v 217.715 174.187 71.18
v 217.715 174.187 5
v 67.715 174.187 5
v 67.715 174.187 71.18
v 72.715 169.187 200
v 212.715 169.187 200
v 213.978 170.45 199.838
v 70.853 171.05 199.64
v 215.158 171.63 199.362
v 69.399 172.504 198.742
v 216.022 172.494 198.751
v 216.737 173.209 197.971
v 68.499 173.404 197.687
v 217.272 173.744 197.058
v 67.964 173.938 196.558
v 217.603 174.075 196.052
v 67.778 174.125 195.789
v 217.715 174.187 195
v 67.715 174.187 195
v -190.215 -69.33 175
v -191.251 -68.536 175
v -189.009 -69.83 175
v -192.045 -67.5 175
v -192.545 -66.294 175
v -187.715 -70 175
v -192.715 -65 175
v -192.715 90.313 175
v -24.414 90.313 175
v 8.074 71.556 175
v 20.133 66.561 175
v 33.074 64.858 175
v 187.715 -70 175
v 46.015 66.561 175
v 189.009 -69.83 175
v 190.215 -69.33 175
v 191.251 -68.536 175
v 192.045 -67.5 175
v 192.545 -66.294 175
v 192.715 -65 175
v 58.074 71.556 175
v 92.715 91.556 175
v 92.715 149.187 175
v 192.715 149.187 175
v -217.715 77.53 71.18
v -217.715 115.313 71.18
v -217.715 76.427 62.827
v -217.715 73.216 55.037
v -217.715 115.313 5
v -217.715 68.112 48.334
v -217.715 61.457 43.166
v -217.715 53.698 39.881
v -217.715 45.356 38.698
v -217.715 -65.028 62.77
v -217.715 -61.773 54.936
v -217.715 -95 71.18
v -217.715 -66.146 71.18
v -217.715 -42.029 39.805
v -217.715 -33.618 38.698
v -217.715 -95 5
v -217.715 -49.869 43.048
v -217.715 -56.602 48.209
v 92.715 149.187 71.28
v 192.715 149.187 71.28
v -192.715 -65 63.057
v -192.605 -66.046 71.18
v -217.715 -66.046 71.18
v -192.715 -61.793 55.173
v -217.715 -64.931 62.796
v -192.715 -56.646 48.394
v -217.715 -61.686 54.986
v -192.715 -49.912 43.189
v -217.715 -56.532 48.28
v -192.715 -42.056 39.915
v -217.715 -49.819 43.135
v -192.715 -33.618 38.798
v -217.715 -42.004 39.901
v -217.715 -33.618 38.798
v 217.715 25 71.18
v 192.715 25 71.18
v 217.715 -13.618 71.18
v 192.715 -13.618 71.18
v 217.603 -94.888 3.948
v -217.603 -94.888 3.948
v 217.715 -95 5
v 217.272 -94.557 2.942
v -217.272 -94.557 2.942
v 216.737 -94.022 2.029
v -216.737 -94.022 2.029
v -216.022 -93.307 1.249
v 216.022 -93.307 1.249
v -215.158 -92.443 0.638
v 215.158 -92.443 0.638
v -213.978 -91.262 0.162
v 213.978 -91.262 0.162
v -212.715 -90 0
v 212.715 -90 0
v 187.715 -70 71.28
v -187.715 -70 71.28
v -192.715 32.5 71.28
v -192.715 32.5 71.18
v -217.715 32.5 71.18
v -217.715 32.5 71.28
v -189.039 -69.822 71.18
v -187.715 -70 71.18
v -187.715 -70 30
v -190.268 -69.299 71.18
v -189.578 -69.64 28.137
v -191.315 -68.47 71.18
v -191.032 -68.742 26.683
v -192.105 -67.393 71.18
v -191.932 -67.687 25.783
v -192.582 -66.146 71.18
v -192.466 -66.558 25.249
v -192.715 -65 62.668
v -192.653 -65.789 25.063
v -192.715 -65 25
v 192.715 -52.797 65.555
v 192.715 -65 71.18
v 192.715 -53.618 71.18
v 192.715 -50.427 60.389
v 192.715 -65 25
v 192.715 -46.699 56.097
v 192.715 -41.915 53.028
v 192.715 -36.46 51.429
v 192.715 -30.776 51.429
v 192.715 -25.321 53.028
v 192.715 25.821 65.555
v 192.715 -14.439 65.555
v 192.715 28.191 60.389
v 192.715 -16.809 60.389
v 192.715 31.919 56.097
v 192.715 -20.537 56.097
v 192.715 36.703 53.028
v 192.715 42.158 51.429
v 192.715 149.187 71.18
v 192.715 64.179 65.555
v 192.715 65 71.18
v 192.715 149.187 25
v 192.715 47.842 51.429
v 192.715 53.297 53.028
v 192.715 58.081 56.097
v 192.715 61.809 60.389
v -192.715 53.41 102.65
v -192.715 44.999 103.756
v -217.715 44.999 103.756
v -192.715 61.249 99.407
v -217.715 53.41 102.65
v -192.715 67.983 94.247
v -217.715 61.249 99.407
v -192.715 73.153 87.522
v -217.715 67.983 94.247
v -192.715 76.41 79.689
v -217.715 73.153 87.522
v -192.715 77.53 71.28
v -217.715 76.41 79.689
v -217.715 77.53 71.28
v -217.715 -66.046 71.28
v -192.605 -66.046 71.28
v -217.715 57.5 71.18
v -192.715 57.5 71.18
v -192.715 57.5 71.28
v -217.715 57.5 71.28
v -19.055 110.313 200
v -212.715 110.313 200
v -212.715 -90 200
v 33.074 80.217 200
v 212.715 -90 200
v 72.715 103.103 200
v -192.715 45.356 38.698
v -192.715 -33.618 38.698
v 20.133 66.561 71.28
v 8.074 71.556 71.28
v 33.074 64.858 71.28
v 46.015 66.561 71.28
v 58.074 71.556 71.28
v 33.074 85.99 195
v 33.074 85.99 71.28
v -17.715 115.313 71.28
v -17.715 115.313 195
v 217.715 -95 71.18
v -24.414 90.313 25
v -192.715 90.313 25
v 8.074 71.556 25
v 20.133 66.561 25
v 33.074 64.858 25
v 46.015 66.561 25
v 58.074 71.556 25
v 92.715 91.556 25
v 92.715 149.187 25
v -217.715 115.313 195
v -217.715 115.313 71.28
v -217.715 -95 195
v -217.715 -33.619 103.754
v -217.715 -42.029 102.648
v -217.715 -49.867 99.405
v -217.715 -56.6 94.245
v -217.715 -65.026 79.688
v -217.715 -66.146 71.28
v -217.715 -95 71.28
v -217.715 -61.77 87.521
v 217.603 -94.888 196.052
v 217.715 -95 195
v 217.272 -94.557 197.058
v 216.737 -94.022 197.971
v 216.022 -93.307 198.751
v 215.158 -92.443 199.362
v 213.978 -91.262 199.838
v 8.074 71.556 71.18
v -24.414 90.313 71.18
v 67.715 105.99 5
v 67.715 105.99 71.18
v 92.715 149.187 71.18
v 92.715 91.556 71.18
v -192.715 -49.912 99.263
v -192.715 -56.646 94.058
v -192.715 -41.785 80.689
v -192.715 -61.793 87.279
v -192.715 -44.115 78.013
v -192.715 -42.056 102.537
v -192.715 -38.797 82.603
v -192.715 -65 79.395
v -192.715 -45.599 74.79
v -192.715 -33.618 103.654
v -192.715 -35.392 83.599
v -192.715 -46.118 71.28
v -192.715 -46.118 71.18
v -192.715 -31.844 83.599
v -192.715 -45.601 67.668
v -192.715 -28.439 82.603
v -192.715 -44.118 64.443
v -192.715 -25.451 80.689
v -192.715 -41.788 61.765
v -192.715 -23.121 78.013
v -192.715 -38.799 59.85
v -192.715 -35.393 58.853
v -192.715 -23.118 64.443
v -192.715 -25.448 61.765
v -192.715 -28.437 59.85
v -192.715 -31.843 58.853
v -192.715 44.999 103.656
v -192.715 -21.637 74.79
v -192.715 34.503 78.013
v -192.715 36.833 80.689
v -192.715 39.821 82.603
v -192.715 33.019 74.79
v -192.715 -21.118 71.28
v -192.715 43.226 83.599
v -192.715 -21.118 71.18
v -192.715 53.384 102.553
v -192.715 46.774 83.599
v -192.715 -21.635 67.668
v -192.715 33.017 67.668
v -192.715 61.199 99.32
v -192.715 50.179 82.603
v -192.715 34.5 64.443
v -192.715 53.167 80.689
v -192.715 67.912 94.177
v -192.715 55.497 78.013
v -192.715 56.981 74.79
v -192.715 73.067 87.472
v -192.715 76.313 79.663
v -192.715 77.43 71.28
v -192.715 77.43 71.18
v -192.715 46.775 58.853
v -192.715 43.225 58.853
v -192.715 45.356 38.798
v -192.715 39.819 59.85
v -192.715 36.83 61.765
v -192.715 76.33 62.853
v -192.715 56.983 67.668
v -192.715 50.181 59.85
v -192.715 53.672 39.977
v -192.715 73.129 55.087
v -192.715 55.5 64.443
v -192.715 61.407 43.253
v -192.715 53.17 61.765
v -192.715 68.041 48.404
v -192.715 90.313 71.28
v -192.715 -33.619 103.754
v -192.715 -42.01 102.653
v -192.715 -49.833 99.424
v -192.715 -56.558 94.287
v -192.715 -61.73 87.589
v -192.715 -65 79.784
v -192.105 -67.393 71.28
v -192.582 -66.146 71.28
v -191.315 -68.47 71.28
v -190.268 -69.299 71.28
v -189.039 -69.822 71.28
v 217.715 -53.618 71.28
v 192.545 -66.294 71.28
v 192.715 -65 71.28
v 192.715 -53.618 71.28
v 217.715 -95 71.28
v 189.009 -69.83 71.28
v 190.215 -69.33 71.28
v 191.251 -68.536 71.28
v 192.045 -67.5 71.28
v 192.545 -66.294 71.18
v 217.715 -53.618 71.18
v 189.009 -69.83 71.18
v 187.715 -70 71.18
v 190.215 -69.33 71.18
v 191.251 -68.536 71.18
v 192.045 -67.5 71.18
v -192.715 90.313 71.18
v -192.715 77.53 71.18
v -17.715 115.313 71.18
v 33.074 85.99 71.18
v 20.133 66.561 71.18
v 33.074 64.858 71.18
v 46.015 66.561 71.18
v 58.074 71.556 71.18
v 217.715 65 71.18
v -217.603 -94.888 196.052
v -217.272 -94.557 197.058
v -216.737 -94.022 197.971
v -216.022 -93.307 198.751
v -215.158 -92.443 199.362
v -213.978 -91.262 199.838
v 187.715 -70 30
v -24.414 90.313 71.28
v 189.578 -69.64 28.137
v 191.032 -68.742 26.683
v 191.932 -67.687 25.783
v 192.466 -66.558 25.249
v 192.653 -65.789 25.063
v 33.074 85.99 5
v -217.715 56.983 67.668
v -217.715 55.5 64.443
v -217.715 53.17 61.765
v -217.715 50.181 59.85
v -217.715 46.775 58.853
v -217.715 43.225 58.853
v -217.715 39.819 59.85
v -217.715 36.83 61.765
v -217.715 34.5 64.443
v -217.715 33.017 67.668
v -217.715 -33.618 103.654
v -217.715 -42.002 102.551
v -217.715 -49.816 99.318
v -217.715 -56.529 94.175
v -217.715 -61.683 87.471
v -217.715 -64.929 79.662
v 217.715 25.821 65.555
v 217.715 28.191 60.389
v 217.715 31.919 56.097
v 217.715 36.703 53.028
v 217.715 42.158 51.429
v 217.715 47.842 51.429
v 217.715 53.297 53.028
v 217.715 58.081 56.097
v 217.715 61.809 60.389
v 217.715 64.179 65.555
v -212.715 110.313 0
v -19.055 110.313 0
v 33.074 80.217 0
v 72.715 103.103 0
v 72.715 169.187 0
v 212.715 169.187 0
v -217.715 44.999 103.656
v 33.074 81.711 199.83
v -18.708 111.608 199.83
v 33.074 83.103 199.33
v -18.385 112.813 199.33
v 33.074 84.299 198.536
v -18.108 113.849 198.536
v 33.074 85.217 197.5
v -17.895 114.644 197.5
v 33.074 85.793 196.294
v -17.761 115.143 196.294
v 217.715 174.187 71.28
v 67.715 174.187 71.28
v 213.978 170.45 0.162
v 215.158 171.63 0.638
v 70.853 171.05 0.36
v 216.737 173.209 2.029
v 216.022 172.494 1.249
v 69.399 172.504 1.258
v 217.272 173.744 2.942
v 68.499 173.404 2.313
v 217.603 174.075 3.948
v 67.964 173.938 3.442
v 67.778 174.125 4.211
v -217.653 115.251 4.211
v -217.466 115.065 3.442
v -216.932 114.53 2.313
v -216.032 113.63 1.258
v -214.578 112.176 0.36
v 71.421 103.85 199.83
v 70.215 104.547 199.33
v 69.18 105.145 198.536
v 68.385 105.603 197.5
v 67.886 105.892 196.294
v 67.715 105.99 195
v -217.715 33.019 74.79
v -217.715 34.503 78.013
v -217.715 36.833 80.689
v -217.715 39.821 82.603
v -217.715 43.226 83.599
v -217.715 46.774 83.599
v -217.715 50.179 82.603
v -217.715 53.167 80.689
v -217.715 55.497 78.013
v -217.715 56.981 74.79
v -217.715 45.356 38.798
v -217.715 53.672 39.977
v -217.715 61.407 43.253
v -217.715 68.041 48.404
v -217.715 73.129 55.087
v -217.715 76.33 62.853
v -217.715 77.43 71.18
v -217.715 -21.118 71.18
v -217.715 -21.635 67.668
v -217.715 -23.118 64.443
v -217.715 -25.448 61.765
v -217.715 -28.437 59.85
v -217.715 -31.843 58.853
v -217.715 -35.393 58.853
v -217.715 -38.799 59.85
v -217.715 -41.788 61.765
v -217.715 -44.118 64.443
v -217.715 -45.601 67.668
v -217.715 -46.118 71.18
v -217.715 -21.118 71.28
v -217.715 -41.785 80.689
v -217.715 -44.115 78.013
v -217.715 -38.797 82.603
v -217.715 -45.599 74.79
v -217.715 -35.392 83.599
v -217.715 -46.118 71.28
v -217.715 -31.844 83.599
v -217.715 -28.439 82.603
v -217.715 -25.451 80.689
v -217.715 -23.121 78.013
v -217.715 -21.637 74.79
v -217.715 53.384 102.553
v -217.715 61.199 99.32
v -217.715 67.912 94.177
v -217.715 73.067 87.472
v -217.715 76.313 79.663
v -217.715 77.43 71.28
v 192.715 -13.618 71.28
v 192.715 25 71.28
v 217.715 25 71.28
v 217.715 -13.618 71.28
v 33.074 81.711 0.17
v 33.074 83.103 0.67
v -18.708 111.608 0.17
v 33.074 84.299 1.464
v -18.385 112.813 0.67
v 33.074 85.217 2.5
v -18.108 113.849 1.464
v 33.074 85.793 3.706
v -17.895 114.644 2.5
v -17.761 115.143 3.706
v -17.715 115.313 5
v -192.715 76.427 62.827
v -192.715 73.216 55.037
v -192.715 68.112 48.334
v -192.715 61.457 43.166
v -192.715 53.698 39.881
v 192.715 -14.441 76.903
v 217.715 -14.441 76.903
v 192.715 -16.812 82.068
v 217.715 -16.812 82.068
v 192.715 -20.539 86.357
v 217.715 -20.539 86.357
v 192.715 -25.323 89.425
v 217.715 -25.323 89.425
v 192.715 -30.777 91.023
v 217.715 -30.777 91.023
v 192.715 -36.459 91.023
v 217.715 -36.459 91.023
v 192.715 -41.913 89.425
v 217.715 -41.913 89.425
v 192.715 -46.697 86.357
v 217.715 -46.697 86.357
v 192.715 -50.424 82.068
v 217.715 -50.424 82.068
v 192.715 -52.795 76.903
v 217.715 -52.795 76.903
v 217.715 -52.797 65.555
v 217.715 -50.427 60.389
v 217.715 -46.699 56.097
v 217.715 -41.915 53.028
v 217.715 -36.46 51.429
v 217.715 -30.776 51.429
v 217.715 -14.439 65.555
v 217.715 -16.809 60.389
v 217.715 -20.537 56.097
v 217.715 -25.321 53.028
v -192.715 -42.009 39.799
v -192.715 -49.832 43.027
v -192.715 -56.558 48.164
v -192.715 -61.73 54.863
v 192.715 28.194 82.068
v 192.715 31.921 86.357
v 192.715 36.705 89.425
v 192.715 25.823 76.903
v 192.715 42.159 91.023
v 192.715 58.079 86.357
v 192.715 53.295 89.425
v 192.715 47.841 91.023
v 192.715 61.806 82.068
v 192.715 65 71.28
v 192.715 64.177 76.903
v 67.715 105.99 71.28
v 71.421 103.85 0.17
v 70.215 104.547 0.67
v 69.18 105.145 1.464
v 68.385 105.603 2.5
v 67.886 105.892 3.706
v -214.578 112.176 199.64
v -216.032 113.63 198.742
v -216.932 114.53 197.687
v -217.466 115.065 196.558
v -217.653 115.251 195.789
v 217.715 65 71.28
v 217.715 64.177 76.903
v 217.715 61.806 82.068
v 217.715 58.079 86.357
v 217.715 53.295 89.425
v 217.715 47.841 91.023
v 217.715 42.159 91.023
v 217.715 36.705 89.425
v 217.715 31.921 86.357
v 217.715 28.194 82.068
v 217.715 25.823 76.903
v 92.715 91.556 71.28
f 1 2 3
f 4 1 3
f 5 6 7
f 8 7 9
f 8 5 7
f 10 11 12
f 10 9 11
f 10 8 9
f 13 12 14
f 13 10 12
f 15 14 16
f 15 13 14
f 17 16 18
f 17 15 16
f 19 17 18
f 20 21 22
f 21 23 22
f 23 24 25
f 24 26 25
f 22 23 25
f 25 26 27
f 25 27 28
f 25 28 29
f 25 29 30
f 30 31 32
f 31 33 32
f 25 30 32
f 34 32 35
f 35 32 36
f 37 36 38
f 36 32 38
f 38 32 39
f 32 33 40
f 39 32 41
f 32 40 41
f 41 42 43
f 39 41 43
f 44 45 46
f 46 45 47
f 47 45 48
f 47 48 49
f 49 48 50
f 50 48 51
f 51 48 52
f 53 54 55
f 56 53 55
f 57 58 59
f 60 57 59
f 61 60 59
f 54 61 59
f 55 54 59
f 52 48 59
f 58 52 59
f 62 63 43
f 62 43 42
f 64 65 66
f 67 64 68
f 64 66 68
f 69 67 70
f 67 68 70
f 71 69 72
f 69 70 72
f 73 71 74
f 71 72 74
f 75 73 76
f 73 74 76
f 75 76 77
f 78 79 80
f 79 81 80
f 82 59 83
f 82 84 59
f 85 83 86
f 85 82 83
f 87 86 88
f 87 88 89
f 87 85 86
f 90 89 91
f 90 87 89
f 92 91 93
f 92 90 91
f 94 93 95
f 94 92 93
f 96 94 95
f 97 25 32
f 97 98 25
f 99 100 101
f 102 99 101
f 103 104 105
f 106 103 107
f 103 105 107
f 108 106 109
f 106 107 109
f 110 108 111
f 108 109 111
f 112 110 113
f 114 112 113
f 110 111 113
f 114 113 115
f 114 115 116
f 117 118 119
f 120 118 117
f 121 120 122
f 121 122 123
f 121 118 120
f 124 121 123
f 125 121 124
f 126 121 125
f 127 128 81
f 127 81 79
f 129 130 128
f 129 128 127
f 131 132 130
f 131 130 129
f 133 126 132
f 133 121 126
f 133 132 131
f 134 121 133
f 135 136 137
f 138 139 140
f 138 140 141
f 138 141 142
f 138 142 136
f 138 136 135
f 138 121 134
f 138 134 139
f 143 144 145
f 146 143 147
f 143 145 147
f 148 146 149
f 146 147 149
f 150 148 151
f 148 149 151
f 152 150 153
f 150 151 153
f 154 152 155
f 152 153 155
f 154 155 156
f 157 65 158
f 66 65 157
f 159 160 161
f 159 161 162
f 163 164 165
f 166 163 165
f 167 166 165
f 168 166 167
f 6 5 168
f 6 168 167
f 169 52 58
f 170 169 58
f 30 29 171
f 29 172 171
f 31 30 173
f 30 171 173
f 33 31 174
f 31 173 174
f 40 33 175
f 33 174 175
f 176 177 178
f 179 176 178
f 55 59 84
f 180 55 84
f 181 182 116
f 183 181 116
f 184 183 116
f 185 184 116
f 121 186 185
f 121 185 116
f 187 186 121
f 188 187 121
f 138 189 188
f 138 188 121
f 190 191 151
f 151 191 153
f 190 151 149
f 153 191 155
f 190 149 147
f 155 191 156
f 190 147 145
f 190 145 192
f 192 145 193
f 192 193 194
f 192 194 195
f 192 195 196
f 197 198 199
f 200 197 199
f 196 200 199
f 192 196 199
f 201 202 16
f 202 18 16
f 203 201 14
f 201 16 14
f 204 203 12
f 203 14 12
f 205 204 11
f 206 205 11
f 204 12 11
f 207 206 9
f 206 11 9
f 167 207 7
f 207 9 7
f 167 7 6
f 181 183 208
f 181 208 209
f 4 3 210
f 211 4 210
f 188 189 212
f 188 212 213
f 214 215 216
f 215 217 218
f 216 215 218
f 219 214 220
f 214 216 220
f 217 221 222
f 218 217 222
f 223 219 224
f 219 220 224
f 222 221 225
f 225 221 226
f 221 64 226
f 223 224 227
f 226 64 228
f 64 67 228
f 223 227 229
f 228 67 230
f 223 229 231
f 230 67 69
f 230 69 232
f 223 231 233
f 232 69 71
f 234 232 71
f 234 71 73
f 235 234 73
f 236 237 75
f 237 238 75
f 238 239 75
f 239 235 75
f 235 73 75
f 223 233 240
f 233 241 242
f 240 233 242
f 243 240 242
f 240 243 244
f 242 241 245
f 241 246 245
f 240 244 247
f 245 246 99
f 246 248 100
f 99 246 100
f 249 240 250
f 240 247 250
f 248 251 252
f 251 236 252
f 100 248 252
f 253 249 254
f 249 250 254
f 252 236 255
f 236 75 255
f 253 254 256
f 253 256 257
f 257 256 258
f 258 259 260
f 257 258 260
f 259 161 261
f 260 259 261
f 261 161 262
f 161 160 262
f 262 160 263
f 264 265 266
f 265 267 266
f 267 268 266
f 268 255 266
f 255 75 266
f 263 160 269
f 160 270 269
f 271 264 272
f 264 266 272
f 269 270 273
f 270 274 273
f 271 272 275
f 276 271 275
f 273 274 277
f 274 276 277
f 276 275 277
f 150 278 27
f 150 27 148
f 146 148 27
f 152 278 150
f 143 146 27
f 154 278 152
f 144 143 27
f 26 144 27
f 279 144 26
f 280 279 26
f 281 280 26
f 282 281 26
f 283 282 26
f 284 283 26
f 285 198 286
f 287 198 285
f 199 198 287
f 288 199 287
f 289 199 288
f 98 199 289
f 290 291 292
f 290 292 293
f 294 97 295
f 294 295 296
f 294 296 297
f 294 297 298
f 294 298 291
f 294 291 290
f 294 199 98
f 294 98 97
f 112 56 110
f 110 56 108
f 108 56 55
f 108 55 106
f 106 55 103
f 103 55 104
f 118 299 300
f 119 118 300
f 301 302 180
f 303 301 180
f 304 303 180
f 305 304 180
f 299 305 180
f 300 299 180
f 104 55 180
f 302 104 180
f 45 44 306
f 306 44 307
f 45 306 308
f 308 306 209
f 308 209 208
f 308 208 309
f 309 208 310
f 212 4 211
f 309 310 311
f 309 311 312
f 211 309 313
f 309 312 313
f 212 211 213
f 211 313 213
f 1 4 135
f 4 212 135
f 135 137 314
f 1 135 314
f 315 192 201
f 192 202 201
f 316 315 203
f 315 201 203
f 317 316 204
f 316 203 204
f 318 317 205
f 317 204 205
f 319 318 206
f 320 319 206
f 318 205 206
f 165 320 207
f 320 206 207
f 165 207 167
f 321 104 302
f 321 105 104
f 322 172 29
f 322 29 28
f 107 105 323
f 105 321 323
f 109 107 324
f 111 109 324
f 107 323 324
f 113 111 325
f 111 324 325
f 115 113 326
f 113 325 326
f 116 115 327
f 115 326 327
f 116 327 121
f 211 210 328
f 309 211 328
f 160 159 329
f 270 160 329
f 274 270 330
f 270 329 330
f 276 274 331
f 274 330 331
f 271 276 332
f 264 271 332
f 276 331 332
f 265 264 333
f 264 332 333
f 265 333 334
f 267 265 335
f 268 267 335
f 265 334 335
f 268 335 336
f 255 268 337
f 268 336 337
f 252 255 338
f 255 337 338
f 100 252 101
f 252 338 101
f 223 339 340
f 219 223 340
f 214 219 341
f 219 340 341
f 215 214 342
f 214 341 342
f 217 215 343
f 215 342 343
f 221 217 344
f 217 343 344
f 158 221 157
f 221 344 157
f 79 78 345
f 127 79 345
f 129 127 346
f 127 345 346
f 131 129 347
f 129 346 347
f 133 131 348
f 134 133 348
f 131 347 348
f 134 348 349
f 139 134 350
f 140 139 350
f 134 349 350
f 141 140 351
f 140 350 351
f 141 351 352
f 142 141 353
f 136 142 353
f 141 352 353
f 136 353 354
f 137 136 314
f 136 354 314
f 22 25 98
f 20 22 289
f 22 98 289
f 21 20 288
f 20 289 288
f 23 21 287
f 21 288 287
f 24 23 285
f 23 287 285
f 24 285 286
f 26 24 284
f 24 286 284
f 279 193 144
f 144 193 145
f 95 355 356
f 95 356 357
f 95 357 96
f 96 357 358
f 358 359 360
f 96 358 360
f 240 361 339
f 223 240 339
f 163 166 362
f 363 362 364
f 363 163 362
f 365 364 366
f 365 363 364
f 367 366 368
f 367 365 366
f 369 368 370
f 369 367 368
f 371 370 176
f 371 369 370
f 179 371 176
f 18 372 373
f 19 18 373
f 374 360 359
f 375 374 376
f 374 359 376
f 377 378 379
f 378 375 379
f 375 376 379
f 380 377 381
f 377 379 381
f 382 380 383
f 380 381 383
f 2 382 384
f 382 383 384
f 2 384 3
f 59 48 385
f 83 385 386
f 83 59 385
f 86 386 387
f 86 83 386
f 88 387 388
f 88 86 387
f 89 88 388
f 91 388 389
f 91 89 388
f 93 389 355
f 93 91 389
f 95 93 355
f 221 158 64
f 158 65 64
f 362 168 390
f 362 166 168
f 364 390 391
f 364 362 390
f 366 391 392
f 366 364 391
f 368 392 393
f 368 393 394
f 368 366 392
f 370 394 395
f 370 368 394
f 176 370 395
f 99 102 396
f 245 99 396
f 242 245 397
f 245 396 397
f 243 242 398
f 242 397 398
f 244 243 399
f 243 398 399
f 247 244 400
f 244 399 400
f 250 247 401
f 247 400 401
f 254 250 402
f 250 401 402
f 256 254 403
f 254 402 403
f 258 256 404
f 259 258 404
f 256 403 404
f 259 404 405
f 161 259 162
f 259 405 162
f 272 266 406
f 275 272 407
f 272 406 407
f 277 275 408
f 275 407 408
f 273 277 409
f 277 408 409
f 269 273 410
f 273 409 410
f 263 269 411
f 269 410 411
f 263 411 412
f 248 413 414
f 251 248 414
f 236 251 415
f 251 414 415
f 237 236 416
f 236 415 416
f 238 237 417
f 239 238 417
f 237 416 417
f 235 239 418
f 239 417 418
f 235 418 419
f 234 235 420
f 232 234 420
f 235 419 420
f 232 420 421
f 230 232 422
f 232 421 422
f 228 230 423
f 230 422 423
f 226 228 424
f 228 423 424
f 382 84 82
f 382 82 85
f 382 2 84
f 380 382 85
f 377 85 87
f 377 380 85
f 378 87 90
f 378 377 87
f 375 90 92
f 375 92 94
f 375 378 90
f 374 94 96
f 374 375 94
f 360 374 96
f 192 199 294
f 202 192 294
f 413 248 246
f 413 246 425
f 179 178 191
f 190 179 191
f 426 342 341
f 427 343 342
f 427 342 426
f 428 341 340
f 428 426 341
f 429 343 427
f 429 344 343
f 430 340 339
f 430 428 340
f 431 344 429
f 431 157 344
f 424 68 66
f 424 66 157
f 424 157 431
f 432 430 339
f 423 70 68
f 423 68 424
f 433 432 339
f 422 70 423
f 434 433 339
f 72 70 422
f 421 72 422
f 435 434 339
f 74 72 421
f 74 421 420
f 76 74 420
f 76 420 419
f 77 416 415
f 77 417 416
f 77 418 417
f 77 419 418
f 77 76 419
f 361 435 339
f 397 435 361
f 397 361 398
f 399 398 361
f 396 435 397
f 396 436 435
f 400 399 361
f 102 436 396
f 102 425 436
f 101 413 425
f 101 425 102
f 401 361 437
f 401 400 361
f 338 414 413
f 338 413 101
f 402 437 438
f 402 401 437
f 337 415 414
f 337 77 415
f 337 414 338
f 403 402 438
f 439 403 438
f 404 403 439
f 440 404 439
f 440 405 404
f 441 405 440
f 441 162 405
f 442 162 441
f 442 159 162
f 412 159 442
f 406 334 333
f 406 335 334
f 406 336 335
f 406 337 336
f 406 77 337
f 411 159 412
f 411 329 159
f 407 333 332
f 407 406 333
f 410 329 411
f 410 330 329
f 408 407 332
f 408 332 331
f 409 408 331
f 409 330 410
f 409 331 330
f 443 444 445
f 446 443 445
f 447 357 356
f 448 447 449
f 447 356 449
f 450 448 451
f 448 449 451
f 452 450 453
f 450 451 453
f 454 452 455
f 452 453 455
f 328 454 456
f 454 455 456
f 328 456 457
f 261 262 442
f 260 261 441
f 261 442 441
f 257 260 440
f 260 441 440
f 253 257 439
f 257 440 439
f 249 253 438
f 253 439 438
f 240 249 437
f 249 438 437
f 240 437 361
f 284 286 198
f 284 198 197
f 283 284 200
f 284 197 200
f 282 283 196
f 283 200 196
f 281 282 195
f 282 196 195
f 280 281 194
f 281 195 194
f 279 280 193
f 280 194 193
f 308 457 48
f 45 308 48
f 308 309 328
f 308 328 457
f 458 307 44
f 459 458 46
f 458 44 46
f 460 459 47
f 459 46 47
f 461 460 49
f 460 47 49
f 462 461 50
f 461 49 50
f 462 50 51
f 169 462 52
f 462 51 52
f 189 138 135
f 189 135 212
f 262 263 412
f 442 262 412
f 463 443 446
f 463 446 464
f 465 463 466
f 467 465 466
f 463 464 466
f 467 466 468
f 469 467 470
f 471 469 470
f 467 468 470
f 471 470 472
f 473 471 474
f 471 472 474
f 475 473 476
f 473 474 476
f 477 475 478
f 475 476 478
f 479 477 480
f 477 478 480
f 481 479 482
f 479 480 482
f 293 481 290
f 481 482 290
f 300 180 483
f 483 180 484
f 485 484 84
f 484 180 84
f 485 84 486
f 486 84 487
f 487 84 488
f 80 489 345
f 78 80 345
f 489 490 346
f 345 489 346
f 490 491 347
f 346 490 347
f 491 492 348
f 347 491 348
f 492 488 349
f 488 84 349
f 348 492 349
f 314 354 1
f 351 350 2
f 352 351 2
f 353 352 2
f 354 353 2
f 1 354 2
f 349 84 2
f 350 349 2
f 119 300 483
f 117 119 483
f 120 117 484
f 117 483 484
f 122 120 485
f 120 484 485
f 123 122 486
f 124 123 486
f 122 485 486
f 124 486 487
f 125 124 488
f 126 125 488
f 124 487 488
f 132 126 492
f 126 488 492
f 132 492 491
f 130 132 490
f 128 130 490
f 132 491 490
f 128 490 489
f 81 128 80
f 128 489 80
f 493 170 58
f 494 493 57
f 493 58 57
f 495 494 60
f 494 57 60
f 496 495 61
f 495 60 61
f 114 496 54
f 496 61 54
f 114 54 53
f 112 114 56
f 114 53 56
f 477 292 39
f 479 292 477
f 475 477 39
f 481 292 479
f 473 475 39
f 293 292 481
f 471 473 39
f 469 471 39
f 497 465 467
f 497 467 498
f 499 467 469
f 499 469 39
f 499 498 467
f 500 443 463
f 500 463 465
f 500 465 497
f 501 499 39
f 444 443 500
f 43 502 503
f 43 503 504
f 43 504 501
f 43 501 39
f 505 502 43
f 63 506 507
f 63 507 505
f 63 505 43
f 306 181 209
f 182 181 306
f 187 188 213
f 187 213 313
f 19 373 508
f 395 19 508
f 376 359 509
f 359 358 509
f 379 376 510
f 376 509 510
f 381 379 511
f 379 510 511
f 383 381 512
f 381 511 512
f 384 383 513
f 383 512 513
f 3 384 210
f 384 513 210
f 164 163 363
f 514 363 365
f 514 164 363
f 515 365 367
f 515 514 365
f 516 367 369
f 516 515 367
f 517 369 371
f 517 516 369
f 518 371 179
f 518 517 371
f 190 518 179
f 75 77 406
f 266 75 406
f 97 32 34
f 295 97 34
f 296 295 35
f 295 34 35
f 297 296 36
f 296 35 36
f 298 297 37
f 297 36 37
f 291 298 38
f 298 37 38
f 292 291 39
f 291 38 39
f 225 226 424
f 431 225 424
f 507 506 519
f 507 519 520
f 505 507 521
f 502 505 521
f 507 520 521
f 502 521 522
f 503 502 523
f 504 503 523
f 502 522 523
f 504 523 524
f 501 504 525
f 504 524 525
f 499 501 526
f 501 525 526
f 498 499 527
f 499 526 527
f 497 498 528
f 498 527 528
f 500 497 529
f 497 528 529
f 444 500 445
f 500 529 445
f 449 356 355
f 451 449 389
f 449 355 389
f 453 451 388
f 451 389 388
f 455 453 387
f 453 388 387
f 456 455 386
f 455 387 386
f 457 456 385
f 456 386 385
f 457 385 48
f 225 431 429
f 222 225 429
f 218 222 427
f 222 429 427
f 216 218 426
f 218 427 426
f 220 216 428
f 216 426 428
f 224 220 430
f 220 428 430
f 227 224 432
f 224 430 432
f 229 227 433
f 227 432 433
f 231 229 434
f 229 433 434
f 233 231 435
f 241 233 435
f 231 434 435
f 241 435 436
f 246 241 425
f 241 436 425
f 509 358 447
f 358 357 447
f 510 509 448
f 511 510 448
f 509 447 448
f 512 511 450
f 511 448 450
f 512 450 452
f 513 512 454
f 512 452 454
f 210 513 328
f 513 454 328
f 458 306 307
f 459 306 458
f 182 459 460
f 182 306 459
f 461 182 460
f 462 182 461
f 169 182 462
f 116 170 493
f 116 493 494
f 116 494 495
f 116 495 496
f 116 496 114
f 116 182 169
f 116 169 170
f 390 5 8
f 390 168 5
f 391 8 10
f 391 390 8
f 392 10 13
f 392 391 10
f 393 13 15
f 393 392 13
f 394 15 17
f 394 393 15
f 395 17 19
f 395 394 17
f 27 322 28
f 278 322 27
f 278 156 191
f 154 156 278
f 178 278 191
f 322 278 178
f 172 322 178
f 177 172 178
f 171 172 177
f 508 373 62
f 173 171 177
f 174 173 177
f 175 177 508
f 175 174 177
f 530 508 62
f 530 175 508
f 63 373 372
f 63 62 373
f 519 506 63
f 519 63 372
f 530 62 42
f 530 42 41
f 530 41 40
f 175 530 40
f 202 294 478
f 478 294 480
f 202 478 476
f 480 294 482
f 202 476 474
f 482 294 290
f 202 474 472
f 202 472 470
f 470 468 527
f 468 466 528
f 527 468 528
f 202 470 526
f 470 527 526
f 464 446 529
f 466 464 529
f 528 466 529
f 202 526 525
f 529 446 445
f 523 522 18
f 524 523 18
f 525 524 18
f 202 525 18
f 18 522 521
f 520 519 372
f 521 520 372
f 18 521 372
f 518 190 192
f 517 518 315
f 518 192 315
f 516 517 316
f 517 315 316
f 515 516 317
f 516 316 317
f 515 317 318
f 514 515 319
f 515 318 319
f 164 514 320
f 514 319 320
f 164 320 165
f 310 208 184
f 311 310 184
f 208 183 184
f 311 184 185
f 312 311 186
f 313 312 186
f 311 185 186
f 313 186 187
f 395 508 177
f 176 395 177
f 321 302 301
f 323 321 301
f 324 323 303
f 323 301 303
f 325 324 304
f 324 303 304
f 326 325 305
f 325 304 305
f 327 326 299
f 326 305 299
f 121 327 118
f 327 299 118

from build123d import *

# Parameters (mm, degrees)
F1_DEPTH  = 200
F2_T      = -25
F3_R      = 20
F4_DEPTH  = 25
F5_R      = 5
F6_R      = 12.5
F7_DEPTH  = 25
F8_W      = 515.9801917831
F8_H      = 0.1
F9_DEPTH  = 500
F11_DEPTH = 25
F12_R     = 50
F14_DEPTH = 30
F15_DEPTH = 0.1


with BuildPart() as f1:
    # F0 (on Top) → F1 (new body)
    with BuildSketch(Plane.XY):
        Polygon((-217.7152904997, -95), (217.7152904997, -95), (217.7152904997, 95), (217.7152904997, 174.1873925667), (67.7152904997, 174.1873925667), (67.7152904997, 105.9900790749), (33.0742743483, 85.9900790749), (-17.7152904997, 115.3134480119), (-217.7152904997, 115.3134480119), (-217.7152904997, 95), align=None)
    extrude(amount=F1_DEPTH)

    # F2
    f2_openings = [f1.faces().sort_by_distance(p)[0] for p in [
        (12.289401, 20.806229, 200),
    ]]
    offset(amount=F2_T, openings=f2_openings, kind=Kind.INTERSECTION)

    # F3 (on face) → F4 (cut)
    with BuildSketch(Plane.YZ.offset(217.7152904997)):
        with Locations((45, 71.226)):
            Circle(F3_R)
        with Locations((-33.618, 71.226)):
            Circle(F3_R)
    extrude(amount=-F4_DEPTH, mode=Mode.SUBTRACT)

    # F5
    f5_edges = [f1.edges().sort_by_distance(p)[0] for p in [
        (0, -70, 25),
        (0, -95, 200),
        (217.71529, 39.593696, 200),
        (142.71529, 174.187393, 200),
        (67.71529, 140.088736, 200),
        (50.394782, 95.990079, 200),
        (7.679492, 100.651764, 200),
        (-117.71529, 115.313448, 200),
        (-217.71529, 10.156724, 200),
        (0, -95, 0),
        (217.71529, 39.593696, 0),
        (142.71529, 174.187393, 0),
        (67.71529, 140.088736, 0),
        (50.394782, 95.990079, 0),
        (7.679492, 100.651764, 0),
        (-117.71529, 115.313448, 0),
        (-217.71529, 10.156724, 0),
        (-192.71529, -70, 112.5),
        (192.71529, -70, 112.5),
    ]]
    fillet(f5_edges, radius=F5_R)

    # F6 (on face) → F7 (cut)
    with BuildSketch(Plane(origin=(-217.7152904997, 0, 0), x_dir=(0, -1, 0), z_dir=(-1, 0, 0))):
        with Locations((-45, 71.226)):
            Circle(F6_R)
        with Locations((33.618, 71.226)):
            Circle(F6_R)
    extrude(amount=-F7_DEPTH, mode=Mode.SUBTRACT)

    # F8 (on face) → F9 (cut)
    with BuildSketch(Plane.XZ.offset(95)):
        with Locations((13.46298667, 71.23)):
            Rectangle(F8_W, F8_H)
    extrude(amount=-F9_DEPTH, mode=Mode.SUBTRACT)

    # F10 (on face) → F11 (join)
    with BuildSketch(Plane.XY.offset(200)):
        Polygon((-197.7152904997, 95.3134480119), (-212.7152904997, -90), (197.7152904997, -75), (197.7152904997, 154.1873925667), (87.7152904997, 154.1873925667), (87.7152904997, 94.4430736911), (33.0742743483, 62.8960683073), (-23.0742743483, 95.3134480119), align=None)
    extrude(amount=-F11_DEPTH)

    # F12
    f12_edges = [f1.edges().sort_by_distance(p)[0] for p in [
        (33.074274, 57.122566, 48.09),
        (33.074274, 57.122566, 123.14),
    ]]
    fillet(f12_edges, radius=F12_R)

    # F13 (on face) → F14 (cut)
    with BuildSketch(Plane(origin=(-217.7152904997, 0, 0), x_dir=(0, -1, 0), z_dir=(-1, 0, 0))):
        with BuildLine():
            Line((33.6188076483, 103.7538542444), (-44.9991923032, 103.7558062851))
            ThreePointArc((-44.9991923032, 103.7558062851), (-77.5293160692, 71.4045879899), (-45.3563629488, 38.6981457356))
            Line((-45.3563629488, 38.6981457356), (33.618, 38.6981457356))
            ThreePointArc((33.618, 38.6981457356), (66.1458542619, 71.2255961758), (33.6188076483, 103.7538542544))
        make_face()
        with BuildLine():
            ThreePointArc((-45.3558147624, 38.7981457356), (-77.4293160726, 71.4043126593), (-44.9991947862, 103.6558062851))
            Line((-44.9991947862, 103.6558062851), (33.618, 103.6538542644))
            ThreePointArc((33.618, 103.6538542644), (66.0458542644, 71.226), (33.618, 38.7981457356))
            Line((33.618, 38.7981457356), (-45.3558147624, 38.7981457356))
        make_face(mode=Mode.SUBTRACT)
    extrude(amount=-F14_DEPTH, mode=Mode.SUBTRACT)

    # F15 (add): faces of the model
    f15_faces = [f1.faces().sort_by_distance(p)[0] for p in [
        (-205.2152904997, 5.691, 71.18),
        (-205.2152904997, 67.4648445152, 71.18),
        (-205.2143249793, -56.0826160003, 71.18),
    ]]
    extrude(f15_faces, amount=F15_DEPTH)


solid = f1.part
